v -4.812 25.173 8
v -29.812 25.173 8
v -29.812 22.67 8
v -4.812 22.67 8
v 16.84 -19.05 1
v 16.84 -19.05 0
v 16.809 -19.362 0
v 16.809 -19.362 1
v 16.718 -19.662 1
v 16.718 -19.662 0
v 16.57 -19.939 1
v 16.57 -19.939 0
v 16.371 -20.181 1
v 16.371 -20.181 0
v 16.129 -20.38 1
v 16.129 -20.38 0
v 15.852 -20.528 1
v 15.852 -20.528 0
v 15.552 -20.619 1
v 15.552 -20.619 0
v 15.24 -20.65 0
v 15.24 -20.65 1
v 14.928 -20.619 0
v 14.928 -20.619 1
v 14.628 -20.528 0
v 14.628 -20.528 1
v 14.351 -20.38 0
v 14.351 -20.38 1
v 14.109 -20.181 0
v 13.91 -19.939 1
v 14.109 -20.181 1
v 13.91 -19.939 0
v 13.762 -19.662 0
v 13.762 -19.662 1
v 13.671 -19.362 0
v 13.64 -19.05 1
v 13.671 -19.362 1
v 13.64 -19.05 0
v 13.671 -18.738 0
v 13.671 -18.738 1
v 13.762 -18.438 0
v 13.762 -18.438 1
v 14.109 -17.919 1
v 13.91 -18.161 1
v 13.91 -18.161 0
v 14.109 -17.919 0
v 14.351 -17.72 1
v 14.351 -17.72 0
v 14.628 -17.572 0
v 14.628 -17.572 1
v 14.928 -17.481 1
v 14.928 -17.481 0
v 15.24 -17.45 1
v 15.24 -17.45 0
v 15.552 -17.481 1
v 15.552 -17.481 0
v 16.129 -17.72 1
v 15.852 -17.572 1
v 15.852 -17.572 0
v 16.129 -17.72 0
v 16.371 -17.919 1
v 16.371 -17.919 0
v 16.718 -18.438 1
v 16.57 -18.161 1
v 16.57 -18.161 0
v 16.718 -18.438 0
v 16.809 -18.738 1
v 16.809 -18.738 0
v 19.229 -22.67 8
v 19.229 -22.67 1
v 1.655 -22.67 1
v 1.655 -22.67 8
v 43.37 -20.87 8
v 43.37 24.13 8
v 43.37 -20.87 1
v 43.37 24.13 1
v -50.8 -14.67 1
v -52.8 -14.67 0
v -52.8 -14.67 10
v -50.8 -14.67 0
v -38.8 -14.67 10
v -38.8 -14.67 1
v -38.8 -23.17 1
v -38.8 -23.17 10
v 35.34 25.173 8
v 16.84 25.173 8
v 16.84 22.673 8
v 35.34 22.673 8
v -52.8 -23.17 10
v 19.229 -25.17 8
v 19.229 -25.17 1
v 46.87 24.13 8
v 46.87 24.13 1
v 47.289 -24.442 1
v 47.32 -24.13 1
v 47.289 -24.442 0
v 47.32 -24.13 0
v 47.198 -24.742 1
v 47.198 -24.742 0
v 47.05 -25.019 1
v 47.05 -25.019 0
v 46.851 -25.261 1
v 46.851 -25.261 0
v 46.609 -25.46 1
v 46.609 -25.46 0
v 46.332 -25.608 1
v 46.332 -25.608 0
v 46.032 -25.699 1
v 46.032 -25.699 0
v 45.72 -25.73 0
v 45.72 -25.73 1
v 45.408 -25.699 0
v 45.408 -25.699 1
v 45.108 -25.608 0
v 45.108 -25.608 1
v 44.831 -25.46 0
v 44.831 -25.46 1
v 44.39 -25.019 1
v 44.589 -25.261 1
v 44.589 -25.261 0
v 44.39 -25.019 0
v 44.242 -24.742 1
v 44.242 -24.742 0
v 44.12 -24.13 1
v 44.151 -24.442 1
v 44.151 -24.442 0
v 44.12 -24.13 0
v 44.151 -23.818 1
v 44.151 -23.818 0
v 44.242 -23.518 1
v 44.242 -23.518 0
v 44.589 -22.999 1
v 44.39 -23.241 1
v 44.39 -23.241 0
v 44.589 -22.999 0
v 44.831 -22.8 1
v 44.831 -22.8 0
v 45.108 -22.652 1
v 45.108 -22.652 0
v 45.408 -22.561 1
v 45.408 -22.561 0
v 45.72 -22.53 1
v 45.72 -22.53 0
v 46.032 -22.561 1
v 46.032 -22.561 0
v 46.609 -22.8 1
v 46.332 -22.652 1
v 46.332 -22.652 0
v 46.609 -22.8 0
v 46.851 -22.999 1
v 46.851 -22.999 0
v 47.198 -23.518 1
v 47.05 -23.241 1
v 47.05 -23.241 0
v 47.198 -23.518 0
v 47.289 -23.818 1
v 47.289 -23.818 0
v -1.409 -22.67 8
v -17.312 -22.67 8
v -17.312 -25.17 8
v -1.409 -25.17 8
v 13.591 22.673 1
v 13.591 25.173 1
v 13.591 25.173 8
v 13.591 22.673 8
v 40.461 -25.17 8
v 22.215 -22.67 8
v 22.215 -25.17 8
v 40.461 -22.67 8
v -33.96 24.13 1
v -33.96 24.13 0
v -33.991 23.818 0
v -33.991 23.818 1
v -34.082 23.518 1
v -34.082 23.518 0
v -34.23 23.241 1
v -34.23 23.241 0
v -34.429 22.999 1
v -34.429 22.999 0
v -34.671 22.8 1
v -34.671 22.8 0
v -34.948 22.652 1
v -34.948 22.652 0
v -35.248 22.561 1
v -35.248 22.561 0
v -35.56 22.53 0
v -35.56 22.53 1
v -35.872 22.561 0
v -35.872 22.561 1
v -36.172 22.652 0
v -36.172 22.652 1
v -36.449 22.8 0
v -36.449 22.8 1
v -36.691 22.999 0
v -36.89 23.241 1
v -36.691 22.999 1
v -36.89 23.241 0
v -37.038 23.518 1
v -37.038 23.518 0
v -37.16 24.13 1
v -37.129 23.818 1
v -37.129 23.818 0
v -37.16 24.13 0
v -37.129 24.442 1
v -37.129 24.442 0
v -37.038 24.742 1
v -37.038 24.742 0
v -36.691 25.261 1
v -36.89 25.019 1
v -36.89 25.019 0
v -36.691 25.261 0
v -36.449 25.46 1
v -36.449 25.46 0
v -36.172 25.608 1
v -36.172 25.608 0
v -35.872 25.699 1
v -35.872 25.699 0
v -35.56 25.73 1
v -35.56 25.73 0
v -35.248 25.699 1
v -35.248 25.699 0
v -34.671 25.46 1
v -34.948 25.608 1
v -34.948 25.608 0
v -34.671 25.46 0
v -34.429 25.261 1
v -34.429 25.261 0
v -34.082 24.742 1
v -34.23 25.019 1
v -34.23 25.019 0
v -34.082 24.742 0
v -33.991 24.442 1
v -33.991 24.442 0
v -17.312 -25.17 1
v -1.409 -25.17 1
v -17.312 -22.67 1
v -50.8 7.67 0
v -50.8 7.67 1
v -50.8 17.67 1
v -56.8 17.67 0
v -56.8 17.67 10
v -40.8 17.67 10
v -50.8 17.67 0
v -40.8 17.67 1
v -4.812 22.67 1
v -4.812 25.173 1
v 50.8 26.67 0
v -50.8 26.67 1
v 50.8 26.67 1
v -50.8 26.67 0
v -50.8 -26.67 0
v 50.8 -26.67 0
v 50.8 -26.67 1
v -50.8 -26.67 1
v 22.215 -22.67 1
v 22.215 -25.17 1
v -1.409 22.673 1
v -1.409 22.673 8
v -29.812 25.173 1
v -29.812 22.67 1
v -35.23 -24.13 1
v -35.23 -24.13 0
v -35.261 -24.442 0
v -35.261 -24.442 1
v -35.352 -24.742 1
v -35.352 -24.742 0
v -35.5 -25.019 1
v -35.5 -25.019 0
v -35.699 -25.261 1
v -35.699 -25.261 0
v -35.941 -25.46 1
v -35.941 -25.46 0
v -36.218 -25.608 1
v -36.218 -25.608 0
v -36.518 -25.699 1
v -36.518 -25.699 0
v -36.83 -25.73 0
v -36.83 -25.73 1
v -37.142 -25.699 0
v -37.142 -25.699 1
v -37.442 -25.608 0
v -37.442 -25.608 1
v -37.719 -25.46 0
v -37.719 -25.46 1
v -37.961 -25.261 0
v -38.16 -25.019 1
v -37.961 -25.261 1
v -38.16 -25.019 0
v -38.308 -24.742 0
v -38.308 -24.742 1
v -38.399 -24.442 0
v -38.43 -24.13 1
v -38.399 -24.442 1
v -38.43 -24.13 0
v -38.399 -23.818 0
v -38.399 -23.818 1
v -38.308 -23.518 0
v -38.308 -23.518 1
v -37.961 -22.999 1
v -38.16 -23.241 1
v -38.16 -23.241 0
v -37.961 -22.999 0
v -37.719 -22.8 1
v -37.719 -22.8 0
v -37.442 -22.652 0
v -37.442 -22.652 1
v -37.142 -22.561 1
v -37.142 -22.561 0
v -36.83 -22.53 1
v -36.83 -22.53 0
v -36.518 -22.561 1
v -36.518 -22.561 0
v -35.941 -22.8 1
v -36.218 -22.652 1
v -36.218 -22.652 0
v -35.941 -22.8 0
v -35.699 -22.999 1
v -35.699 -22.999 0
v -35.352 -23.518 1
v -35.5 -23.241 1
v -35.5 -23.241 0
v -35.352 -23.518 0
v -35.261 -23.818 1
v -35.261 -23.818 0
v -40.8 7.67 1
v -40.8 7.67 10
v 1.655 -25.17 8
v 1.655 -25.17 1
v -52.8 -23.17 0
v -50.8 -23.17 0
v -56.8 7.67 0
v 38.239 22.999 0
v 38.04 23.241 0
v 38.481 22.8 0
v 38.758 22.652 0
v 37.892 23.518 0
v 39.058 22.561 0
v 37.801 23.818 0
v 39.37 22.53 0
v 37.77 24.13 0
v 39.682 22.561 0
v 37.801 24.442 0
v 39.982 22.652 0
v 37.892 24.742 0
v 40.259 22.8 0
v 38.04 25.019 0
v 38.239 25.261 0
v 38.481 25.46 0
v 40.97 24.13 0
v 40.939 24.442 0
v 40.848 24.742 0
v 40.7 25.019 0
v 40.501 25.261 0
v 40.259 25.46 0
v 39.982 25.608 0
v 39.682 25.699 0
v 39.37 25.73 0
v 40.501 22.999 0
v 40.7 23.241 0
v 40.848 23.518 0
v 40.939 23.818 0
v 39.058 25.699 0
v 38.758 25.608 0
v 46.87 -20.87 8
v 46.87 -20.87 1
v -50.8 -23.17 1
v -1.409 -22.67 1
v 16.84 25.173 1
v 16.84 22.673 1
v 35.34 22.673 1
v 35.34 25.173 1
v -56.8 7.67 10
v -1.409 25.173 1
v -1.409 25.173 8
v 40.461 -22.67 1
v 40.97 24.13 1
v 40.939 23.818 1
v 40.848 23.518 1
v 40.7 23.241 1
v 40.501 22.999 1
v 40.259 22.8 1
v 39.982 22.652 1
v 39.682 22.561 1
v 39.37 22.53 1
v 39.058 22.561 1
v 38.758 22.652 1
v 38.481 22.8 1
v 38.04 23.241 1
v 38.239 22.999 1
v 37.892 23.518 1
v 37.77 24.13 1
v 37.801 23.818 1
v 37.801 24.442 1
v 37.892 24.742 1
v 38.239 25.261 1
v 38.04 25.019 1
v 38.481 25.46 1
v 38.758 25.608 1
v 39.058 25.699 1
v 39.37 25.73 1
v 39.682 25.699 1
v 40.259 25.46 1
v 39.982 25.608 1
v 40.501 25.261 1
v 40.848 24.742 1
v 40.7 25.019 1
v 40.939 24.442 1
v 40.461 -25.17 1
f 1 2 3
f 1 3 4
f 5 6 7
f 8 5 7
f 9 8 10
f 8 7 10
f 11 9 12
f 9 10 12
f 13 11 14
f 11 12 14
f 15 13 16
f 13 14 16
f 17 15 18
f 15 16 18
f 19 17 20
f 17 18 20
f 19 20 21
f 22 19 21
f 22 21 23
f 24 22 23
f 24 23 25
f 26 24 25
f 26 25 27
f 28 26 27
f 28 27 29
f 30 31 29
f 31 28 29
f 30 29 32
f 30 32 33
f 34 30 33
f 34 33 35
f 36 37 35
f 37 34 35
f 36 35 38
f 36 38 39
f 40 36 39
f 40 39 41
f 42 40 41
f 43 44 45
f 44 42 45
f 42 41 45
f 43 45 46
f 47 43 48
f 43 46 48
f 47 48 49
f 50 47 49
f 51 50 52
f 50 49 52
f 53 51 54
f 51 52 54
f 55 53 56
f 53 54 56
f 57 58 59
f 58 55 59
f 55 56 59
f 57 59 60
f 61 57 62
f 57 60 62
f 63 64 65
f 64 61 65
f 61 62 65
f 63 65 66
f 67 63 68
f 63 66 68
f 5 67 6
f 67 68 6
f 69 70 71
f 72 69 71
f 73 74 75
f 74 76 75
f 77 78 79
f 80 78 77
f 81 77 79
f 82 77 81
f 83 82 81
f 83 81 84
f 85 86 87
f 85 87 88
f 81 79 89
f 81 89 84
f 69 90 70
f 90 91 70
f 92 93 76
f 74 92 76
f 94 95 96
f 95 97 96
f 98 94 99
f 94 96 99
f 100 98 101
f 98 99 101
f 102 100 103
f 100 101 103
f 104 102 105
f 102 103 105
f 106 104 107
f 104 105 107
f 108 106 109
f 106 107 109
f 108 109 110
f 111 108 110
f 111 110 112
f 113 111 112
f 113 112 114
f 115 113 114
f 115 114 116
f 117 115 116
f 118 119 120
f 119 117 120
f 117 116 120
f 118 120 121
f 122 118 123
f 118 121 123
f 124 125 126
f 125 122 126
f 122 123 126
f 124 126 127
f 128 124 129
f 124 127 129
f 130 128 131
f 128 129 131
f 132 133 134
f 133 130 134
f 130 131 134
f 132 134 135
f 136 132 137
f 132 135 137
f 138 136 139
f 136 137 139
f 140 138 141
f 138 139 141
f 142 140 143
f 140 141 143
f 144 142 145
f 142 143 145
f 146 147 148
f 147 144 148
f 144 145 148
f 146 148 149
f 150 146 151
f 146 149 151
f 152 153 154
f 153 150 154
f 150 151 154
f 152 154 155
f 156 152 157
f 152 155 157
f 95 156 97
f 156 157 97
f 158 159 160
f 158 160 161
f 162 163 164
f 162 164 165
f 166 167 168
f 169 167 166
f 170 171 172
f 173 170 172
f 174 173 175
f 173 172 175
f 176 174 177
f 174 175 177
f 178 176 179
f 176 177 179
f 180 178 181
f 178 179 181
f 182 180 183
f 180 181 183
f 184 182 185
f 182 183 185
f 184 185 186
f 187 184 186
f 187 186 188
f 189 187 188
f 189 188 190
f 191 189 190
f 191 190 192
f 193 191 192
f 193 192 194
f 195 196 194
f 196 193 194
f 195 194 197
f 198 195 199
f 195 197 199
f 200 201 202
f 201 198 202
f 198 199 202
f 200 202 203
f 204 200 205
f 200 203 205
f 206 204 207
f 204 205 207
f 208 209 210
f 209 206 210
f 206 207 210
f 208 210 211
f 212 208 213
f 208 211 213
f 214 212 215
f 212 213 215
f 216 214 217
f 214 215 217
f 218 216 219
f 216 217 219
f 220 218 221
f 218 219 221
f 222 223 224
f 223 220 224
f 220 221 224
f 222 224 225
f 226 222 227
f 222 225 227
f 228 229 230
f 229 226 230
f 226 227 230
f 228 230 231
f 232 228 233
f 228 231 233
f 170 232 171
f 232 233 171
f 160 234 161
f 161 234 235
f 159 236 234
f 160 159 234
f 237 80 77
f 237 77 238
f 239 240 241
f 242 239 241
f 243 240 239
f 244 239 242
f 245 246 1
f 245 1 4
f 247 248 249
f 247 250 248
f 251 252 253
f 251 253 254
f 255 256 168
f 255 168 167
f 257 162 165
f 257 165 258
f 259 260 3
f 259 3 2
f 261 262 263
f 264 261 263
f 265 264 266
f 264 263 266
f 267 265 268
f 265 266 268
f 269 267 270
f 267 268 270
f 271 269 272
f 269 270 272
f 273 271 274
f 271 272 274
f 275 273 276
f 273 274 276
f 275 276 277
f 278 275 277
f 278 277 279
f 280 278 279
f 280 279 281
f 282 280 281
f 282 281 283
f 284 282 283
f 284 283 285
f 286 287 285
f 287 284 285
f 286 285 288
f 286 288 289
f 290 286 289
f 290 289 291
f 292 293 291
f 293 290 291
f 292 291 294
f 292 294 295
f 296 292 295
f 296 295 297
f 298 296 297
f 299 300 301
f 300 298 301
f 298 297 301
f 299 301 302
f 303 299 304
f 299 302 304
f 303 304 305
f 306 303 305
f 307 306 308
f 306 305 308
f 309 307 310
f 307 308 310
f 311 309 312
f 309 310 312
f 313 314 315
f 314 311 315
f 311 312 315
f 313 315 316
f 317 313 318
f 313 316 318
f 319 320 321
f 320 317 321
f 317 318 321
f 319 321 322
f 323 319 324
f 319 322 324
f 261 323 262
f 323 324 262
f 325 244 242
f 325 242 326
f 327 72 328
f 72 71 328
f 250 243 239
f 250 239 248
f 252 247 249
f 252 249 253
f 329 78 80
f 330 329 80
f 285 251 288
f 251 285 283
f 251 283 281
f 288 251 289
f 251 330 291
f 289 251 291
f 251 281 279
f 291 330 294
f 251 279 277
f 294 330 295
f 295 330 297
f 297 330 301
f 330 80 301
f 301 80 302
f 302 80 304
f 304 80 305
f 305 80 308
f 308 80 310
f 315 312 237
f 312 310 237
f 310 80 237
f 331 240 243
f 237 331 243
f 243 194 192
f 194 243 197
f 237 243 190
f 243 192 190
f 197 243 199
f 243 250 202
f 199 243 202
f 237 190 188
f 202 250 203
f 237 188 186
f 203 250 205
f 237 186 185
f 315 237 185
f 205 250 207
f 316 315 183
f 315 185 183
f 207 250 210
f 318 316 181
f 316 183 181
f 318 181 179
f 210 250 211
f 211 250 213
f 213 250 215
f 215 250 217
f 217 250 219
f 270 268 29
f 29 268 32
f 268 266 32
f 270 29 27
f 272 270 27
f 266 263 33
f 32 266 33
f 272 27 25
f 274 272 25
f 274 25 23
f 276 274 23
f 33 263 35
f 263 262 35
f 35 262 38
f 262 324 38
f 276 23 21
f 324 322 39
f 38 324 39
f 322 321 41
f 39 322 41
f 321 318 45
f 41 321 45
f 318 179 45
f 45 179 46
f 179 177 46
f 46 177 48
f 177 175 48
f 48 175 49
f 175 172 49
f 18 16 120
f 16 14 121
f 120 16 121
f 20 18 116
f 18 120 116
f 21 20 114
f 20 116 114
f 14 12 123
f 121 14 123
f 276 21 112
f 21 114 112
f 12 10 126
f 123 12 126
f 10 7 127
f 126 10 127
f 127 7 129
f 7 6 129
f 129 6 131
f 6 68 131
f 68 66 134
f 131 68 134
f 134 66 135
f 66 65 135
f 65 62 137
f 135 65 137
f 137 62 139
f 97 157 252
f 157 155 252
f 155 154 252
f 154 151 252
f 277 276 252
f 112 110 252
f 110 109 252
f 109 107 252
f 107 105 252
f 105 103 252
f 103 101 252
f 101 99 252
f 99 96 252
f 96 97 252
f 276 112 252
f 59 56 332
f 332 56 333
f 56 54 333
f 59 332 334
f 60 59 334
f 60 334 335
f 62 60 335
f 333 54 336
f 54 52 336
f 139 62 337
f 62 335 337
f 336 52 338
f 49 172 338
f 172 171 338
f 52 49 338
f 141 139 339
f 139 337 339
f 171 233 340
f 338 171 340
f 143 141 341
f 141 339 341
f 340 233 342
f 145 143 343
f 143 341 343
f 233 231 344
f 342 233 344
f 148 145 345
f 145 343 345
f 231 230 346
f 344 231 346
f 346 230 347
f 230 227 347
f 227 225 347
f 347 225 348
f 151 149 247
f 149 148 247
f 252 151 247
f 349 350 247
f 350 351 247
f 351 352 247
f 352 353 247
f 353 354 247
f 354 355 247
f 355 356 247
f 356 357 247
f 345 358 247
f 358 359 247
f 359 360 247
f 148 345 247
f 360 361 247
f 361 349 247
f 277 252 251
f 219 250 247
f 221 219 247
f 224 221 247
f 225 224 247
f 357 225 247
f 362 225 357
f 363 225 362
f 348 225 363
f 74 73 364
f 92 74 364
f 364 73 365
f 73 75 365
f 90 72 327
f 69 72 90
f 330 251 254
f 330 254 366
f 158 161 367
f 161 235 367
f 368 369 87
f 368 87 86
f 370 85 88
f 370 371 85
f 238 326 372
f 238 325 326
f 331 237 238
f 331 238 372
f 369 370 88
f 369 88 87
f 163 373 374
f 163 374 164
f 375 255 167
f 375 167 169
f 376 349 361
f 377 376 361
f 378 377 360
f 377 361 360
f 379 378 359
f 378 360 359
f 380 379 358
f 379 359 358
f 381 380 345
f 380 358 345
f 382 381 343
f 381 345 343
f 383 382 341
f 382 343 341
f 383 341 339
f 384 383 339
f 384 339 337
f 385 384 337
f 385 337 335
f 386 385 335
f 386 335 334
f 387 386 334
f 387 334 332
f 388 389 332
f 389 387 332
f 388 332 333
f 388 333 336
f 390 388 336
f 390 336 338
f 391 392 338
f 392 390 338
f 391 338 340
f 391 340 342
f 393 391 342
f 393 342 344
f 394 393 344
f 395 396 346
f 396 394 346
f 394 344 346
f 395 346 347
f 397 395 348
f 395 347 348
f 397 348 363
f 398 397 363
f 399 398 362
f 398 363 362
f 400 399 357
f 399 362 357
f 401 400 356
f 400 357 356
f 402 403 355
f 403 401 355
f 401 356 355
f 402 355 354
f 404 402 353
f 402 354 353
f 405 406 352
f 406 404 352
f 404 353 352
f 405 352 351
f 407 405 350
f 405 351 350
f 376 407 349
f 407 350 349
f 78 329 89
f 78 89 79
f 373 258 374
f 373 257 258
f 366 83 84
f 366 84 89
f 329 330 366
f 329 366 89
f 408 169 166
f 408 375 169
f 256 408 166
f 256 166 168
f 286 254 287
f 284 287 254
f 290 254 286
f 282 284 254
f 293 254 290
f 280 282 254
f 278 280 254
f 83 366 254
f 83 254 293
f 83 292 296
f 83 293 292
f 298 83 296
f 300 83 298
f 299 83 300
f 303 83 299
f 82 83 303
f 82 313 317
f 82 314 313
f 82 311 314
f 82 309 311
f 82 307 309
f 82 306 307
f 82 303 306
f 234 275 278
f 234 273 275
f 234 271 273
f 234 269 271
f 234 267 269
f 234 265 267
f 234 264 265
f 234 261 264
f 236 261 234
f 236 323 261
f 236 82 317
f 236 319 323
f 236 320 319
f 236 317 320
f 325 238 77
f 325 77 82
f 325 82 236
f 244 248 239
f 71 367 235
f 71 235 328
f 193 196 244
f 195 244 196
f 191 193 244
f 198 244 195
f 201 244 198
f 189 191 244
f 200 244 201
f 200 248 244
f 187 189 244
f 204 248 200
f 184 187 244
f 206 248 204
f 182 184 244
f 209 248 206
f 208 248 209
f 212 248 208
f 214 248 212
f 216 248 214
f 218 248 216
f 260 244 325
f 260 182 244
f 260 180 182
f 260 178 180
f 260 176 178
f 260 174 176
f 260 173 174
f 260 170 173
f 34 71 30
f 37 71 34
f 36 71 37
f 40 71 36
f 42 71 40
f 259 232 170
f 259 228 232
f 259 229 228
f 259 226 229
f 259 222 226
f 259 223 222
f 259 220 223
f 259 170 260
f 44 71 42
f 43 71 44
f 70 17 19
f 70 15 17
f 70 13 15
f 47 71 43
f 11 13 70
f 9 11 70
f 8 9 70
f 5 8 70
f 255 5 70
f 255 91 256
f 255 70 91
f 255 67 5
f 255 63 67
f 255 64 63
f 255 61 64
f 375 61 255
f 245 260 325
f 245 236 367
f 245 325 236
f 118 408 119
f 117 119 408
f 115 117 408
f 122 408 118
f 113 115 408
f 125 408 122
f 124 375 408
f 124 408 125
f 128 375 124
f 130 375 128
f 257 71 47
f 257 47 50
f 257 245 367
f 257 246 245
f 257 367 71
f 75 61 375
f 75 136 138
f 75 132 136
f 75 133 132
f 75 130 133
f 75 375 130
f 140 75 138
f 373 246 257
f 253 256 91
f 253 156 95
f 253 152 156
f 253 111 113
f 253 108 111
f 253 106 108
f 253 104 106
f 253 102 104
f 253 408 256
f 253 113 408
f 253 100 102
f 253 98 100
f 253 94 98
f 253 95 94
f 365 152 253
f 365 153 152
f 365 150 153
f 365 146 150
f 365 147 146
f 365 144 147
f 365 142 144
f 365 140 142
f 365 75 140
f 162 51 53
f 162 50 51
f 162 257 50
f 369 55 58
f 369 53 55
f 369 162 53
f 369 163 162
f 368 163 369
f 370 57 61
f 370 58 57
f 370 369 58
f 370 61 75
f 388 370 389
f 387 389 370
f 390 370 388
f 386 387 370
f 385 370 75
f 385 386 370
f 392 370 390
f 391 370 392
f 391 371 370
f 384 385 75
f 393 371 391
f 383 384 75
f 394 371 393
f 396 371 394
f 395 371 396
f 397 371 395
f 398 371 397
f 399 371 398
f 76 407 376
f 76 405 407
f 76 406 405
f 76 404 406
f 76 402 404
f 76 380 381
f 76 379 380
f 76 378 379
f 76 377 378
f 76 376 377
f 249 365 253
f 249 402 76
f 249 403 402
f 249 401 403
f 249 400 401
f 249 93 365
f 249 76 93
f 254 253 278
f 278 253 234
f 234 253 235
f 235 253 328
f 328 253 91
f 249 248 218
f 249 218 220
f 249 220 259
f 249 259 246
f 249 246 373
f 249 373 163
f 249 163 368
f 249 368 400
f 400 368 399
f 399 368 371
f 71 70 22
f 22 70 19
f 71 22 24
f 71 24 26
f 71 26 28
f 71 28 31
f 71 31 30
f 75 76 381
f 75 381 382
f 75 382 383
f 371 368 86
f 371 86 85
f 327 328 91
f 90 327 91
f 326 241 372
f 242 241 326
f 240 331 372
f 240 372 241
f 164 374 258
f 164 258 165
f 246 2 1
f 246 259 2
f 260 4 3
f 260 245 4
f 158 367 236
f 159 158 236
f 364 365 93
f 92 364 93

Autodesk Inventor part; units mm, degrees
ref_plane "YZ Plane" through (0, 0, 0) normal (1, 0, 0) x (0, 1, 0)
ref_plane "XZ Plane" through (0, 0, 0) normal (0, 1, 0) x (-1, 0, 0)
ref_plane "XY Plane" through (0, 0, 0) normal (0, 0, 1) x (1, 0, 0)
sketch "Skizze1" plane through (0, 0, 0) normal (0, 0, 1) x (1, 0, 0)
  line L0 (-50.8, 26.67) -> (50.8, 26.67)
  line L1 (50.8, 26.67) -> (50.8, -26.67)
  line L2 (50.8, -26.67) -> (-50.8, -26.67)
  line L3 (-50.8, -26.67) -> (-50.8, 26.67)
  line L4 (0, -37.338) -> (0, 37.338) projected
  line L5 (-78.32, 0) -> (72.32, 0) projected
  circle A0 centre (-35.56, 24.13) radius 1.6
  circle A1 centre (-36.83, -24.13) radius 1.6
  circle A2 centre (39.37, 24.13) radius 1.6
  circle A3 centre (45.72, -24.13) radius 1.6
  circle A4 centre (15.24, -19.05) radius 1.6
  line L6 (-29.812, 25.1729) -> (-4.812, 25.1729)
  line L7 (-4.812, 25.1729) -> (-4.812, 22.67)
  line L8 (-4.812, 22.67) -> (-29.812, 22.67)
  line L9 (-29.812, 22.67) -> (-29.812, 25.1729)
  line L10 (-1.4087, 25.1729) -> (13.5913, 25.1729)
  line L11 (13.5913, 25.1729) -> (13.5913, 22.6729)
  line L12 (13.5913, 22.6729) -> (-1.4087, 22.6729)
  line L13 (-1.4087, 22.6729) -> (-1.4087, 25.1729)
  line L14 (16.84, 25.1729) -> (35.34, 25.1729)
  line L15 (35.34, 25.1729) -> (35.34, 22.6729)
  line L16 (35.34, 22.6729) -> (16.84, 22.6729)
  line L17 (16.84, 22.6729) -> (16.84, 25.1729)
  line L18 (46.87, 24.13) -> (43.37, 24.13)
  line L19 (43.37, 24.13) -> (43.37, -20.87)
  line L20 (43.37, -20.87) -> (46.87, -20.87)
  line L21 (46.87, -20.87) -> (46.87, 24.13)
  line L22 (40.4611, -25.17) -> (22.2148, -25.17)
  line L23 (22.2148, -25.17) -> (22.2148, -22.67)
  line L24 (22.2148, -22.67) -> (40.4611, -22.67)
  line L25 (40.4611, -22.67) -> (40.4611, -25.17)
  line L26 (19.229, -22.67) -> (1.6551, -22.67)
  line L27 (1.6551, -22.67) -> (1.6551, -25.17)
  line L28 (1.6551, -25.17) -> (19.229, -25.17)
  line L29 (19.229, -25.17) -> (19.229, -22.67)
  line L30 (-1.4087, -22.67) -> (-17.312, -22.67)
  line L31 (-17.312, -22.67) -> (-17.312, -25.17)
  line L32 (-17.312, -25.17) -> (-1.4087, -25.17)
  line L33 (-1.4087, -25.17) -> (-1.4087, -22.67)
  line L34 (-56.8, 17.67) -> (-40.8, 17.67)
  line L35 (-40.8, 17.67) -> (-40.8, 7.67)
  line L36 (-40.8, 7.67) -> (-56.8, 7.67)
  line L37 (-56.8, 7.67) -> (-56.8, 17.67)
  line L38 (-52.8, -14.67) -> (-38.8, -14.67)
  line L39 (-38.8, -14.67) -> (-38.8, -23.17)
  line L40 (-38.8, -23.17) -> (-52.8, -23.17)
  line L41 (-52.8, -23.17) -> (-52.8, -14.67)
  point P0 (0, 0)
  point P1 (-50.8, 17.67)
  point P2 (-50.8, 7.67)
  point P3 (-50.8, -14.67)
  point P4 (-50.8, -23.17)
  dimension "d0" = 101.6
  dimension "d1" = 53.34
  dimension "d2" = 3.2
  dimension "d3" = 15.24
  dimension "d4" = 3.2
  dimension "d5" = 13.97
  dimension "d6" = 2.54
  dimension "d7" = 48.26
  dimension "d8" = 3.2
  dimension "d9" = 90.17
  dimension "d10" = 3.2
  dimension "d11" = 96.52
  dimension "d12" = 3.2
  dimension "d13" = 66.04
  dimension "d14" = 7.62
  dimension "d15" = 25
  dimension "d16" = 4
  dimension "d17" = 15
  dimension "d18" = 2.5
  dimension "d19" = 18.5
  dimension "d20" = 3.5
  dimension "d21" = 45
  dimension "d22" = 4
  dimension "d23" = 2.5
  dimension "d24" = 4
  dimension "d25" = 9
  dimension "d26" = 10
  dimension "d27" = 16
  dimension "d28" = 6
  dimension "d29" = 8.5
  dimension "d30" = 3.5
  dimension "d31" = 14
  dimension "d32" = 2
extrude "Extrusion1" add sketch "Skizze1" along normal blind 1 contours L0 L4 L10 L13 L12 L5 L3 L36 L35 L34 | L0 L1 L5 L21 L18 L19 L4 L12 L11 L10 | L1 L2 L4 L5 L19 L20 L21 | L5 L4 L2 L3 L40 L39 L38
extrude "Extrusion2" add sketch "Skizze1" along normal blind 8 contours L10 L11 L12 L4 | L4 L12 L13 L10 | L6 L7 L8 L9 | L14 L15 L16 L17 | L22 L23 L24 L25 | L29 L28 L27 L26 | L33 L32 L31 L30
extrude "Extrusion3" add sketch "Skizze1" along normal blind 8 contours L21 L20 L19 L5 | L5 L19 L18 L21
extrude "Extrusion5" add sketch "Skizze1" along normal blind 10 contours L34 L35 L36 L3 | L3 L36 L37 L34
extrude "Extrusion6" add sketch "Skizze1" along normal blind 10 contours L38 L39 L40 L3 | L3 L40 L41 L38
properties part number "ArduinoMega"
